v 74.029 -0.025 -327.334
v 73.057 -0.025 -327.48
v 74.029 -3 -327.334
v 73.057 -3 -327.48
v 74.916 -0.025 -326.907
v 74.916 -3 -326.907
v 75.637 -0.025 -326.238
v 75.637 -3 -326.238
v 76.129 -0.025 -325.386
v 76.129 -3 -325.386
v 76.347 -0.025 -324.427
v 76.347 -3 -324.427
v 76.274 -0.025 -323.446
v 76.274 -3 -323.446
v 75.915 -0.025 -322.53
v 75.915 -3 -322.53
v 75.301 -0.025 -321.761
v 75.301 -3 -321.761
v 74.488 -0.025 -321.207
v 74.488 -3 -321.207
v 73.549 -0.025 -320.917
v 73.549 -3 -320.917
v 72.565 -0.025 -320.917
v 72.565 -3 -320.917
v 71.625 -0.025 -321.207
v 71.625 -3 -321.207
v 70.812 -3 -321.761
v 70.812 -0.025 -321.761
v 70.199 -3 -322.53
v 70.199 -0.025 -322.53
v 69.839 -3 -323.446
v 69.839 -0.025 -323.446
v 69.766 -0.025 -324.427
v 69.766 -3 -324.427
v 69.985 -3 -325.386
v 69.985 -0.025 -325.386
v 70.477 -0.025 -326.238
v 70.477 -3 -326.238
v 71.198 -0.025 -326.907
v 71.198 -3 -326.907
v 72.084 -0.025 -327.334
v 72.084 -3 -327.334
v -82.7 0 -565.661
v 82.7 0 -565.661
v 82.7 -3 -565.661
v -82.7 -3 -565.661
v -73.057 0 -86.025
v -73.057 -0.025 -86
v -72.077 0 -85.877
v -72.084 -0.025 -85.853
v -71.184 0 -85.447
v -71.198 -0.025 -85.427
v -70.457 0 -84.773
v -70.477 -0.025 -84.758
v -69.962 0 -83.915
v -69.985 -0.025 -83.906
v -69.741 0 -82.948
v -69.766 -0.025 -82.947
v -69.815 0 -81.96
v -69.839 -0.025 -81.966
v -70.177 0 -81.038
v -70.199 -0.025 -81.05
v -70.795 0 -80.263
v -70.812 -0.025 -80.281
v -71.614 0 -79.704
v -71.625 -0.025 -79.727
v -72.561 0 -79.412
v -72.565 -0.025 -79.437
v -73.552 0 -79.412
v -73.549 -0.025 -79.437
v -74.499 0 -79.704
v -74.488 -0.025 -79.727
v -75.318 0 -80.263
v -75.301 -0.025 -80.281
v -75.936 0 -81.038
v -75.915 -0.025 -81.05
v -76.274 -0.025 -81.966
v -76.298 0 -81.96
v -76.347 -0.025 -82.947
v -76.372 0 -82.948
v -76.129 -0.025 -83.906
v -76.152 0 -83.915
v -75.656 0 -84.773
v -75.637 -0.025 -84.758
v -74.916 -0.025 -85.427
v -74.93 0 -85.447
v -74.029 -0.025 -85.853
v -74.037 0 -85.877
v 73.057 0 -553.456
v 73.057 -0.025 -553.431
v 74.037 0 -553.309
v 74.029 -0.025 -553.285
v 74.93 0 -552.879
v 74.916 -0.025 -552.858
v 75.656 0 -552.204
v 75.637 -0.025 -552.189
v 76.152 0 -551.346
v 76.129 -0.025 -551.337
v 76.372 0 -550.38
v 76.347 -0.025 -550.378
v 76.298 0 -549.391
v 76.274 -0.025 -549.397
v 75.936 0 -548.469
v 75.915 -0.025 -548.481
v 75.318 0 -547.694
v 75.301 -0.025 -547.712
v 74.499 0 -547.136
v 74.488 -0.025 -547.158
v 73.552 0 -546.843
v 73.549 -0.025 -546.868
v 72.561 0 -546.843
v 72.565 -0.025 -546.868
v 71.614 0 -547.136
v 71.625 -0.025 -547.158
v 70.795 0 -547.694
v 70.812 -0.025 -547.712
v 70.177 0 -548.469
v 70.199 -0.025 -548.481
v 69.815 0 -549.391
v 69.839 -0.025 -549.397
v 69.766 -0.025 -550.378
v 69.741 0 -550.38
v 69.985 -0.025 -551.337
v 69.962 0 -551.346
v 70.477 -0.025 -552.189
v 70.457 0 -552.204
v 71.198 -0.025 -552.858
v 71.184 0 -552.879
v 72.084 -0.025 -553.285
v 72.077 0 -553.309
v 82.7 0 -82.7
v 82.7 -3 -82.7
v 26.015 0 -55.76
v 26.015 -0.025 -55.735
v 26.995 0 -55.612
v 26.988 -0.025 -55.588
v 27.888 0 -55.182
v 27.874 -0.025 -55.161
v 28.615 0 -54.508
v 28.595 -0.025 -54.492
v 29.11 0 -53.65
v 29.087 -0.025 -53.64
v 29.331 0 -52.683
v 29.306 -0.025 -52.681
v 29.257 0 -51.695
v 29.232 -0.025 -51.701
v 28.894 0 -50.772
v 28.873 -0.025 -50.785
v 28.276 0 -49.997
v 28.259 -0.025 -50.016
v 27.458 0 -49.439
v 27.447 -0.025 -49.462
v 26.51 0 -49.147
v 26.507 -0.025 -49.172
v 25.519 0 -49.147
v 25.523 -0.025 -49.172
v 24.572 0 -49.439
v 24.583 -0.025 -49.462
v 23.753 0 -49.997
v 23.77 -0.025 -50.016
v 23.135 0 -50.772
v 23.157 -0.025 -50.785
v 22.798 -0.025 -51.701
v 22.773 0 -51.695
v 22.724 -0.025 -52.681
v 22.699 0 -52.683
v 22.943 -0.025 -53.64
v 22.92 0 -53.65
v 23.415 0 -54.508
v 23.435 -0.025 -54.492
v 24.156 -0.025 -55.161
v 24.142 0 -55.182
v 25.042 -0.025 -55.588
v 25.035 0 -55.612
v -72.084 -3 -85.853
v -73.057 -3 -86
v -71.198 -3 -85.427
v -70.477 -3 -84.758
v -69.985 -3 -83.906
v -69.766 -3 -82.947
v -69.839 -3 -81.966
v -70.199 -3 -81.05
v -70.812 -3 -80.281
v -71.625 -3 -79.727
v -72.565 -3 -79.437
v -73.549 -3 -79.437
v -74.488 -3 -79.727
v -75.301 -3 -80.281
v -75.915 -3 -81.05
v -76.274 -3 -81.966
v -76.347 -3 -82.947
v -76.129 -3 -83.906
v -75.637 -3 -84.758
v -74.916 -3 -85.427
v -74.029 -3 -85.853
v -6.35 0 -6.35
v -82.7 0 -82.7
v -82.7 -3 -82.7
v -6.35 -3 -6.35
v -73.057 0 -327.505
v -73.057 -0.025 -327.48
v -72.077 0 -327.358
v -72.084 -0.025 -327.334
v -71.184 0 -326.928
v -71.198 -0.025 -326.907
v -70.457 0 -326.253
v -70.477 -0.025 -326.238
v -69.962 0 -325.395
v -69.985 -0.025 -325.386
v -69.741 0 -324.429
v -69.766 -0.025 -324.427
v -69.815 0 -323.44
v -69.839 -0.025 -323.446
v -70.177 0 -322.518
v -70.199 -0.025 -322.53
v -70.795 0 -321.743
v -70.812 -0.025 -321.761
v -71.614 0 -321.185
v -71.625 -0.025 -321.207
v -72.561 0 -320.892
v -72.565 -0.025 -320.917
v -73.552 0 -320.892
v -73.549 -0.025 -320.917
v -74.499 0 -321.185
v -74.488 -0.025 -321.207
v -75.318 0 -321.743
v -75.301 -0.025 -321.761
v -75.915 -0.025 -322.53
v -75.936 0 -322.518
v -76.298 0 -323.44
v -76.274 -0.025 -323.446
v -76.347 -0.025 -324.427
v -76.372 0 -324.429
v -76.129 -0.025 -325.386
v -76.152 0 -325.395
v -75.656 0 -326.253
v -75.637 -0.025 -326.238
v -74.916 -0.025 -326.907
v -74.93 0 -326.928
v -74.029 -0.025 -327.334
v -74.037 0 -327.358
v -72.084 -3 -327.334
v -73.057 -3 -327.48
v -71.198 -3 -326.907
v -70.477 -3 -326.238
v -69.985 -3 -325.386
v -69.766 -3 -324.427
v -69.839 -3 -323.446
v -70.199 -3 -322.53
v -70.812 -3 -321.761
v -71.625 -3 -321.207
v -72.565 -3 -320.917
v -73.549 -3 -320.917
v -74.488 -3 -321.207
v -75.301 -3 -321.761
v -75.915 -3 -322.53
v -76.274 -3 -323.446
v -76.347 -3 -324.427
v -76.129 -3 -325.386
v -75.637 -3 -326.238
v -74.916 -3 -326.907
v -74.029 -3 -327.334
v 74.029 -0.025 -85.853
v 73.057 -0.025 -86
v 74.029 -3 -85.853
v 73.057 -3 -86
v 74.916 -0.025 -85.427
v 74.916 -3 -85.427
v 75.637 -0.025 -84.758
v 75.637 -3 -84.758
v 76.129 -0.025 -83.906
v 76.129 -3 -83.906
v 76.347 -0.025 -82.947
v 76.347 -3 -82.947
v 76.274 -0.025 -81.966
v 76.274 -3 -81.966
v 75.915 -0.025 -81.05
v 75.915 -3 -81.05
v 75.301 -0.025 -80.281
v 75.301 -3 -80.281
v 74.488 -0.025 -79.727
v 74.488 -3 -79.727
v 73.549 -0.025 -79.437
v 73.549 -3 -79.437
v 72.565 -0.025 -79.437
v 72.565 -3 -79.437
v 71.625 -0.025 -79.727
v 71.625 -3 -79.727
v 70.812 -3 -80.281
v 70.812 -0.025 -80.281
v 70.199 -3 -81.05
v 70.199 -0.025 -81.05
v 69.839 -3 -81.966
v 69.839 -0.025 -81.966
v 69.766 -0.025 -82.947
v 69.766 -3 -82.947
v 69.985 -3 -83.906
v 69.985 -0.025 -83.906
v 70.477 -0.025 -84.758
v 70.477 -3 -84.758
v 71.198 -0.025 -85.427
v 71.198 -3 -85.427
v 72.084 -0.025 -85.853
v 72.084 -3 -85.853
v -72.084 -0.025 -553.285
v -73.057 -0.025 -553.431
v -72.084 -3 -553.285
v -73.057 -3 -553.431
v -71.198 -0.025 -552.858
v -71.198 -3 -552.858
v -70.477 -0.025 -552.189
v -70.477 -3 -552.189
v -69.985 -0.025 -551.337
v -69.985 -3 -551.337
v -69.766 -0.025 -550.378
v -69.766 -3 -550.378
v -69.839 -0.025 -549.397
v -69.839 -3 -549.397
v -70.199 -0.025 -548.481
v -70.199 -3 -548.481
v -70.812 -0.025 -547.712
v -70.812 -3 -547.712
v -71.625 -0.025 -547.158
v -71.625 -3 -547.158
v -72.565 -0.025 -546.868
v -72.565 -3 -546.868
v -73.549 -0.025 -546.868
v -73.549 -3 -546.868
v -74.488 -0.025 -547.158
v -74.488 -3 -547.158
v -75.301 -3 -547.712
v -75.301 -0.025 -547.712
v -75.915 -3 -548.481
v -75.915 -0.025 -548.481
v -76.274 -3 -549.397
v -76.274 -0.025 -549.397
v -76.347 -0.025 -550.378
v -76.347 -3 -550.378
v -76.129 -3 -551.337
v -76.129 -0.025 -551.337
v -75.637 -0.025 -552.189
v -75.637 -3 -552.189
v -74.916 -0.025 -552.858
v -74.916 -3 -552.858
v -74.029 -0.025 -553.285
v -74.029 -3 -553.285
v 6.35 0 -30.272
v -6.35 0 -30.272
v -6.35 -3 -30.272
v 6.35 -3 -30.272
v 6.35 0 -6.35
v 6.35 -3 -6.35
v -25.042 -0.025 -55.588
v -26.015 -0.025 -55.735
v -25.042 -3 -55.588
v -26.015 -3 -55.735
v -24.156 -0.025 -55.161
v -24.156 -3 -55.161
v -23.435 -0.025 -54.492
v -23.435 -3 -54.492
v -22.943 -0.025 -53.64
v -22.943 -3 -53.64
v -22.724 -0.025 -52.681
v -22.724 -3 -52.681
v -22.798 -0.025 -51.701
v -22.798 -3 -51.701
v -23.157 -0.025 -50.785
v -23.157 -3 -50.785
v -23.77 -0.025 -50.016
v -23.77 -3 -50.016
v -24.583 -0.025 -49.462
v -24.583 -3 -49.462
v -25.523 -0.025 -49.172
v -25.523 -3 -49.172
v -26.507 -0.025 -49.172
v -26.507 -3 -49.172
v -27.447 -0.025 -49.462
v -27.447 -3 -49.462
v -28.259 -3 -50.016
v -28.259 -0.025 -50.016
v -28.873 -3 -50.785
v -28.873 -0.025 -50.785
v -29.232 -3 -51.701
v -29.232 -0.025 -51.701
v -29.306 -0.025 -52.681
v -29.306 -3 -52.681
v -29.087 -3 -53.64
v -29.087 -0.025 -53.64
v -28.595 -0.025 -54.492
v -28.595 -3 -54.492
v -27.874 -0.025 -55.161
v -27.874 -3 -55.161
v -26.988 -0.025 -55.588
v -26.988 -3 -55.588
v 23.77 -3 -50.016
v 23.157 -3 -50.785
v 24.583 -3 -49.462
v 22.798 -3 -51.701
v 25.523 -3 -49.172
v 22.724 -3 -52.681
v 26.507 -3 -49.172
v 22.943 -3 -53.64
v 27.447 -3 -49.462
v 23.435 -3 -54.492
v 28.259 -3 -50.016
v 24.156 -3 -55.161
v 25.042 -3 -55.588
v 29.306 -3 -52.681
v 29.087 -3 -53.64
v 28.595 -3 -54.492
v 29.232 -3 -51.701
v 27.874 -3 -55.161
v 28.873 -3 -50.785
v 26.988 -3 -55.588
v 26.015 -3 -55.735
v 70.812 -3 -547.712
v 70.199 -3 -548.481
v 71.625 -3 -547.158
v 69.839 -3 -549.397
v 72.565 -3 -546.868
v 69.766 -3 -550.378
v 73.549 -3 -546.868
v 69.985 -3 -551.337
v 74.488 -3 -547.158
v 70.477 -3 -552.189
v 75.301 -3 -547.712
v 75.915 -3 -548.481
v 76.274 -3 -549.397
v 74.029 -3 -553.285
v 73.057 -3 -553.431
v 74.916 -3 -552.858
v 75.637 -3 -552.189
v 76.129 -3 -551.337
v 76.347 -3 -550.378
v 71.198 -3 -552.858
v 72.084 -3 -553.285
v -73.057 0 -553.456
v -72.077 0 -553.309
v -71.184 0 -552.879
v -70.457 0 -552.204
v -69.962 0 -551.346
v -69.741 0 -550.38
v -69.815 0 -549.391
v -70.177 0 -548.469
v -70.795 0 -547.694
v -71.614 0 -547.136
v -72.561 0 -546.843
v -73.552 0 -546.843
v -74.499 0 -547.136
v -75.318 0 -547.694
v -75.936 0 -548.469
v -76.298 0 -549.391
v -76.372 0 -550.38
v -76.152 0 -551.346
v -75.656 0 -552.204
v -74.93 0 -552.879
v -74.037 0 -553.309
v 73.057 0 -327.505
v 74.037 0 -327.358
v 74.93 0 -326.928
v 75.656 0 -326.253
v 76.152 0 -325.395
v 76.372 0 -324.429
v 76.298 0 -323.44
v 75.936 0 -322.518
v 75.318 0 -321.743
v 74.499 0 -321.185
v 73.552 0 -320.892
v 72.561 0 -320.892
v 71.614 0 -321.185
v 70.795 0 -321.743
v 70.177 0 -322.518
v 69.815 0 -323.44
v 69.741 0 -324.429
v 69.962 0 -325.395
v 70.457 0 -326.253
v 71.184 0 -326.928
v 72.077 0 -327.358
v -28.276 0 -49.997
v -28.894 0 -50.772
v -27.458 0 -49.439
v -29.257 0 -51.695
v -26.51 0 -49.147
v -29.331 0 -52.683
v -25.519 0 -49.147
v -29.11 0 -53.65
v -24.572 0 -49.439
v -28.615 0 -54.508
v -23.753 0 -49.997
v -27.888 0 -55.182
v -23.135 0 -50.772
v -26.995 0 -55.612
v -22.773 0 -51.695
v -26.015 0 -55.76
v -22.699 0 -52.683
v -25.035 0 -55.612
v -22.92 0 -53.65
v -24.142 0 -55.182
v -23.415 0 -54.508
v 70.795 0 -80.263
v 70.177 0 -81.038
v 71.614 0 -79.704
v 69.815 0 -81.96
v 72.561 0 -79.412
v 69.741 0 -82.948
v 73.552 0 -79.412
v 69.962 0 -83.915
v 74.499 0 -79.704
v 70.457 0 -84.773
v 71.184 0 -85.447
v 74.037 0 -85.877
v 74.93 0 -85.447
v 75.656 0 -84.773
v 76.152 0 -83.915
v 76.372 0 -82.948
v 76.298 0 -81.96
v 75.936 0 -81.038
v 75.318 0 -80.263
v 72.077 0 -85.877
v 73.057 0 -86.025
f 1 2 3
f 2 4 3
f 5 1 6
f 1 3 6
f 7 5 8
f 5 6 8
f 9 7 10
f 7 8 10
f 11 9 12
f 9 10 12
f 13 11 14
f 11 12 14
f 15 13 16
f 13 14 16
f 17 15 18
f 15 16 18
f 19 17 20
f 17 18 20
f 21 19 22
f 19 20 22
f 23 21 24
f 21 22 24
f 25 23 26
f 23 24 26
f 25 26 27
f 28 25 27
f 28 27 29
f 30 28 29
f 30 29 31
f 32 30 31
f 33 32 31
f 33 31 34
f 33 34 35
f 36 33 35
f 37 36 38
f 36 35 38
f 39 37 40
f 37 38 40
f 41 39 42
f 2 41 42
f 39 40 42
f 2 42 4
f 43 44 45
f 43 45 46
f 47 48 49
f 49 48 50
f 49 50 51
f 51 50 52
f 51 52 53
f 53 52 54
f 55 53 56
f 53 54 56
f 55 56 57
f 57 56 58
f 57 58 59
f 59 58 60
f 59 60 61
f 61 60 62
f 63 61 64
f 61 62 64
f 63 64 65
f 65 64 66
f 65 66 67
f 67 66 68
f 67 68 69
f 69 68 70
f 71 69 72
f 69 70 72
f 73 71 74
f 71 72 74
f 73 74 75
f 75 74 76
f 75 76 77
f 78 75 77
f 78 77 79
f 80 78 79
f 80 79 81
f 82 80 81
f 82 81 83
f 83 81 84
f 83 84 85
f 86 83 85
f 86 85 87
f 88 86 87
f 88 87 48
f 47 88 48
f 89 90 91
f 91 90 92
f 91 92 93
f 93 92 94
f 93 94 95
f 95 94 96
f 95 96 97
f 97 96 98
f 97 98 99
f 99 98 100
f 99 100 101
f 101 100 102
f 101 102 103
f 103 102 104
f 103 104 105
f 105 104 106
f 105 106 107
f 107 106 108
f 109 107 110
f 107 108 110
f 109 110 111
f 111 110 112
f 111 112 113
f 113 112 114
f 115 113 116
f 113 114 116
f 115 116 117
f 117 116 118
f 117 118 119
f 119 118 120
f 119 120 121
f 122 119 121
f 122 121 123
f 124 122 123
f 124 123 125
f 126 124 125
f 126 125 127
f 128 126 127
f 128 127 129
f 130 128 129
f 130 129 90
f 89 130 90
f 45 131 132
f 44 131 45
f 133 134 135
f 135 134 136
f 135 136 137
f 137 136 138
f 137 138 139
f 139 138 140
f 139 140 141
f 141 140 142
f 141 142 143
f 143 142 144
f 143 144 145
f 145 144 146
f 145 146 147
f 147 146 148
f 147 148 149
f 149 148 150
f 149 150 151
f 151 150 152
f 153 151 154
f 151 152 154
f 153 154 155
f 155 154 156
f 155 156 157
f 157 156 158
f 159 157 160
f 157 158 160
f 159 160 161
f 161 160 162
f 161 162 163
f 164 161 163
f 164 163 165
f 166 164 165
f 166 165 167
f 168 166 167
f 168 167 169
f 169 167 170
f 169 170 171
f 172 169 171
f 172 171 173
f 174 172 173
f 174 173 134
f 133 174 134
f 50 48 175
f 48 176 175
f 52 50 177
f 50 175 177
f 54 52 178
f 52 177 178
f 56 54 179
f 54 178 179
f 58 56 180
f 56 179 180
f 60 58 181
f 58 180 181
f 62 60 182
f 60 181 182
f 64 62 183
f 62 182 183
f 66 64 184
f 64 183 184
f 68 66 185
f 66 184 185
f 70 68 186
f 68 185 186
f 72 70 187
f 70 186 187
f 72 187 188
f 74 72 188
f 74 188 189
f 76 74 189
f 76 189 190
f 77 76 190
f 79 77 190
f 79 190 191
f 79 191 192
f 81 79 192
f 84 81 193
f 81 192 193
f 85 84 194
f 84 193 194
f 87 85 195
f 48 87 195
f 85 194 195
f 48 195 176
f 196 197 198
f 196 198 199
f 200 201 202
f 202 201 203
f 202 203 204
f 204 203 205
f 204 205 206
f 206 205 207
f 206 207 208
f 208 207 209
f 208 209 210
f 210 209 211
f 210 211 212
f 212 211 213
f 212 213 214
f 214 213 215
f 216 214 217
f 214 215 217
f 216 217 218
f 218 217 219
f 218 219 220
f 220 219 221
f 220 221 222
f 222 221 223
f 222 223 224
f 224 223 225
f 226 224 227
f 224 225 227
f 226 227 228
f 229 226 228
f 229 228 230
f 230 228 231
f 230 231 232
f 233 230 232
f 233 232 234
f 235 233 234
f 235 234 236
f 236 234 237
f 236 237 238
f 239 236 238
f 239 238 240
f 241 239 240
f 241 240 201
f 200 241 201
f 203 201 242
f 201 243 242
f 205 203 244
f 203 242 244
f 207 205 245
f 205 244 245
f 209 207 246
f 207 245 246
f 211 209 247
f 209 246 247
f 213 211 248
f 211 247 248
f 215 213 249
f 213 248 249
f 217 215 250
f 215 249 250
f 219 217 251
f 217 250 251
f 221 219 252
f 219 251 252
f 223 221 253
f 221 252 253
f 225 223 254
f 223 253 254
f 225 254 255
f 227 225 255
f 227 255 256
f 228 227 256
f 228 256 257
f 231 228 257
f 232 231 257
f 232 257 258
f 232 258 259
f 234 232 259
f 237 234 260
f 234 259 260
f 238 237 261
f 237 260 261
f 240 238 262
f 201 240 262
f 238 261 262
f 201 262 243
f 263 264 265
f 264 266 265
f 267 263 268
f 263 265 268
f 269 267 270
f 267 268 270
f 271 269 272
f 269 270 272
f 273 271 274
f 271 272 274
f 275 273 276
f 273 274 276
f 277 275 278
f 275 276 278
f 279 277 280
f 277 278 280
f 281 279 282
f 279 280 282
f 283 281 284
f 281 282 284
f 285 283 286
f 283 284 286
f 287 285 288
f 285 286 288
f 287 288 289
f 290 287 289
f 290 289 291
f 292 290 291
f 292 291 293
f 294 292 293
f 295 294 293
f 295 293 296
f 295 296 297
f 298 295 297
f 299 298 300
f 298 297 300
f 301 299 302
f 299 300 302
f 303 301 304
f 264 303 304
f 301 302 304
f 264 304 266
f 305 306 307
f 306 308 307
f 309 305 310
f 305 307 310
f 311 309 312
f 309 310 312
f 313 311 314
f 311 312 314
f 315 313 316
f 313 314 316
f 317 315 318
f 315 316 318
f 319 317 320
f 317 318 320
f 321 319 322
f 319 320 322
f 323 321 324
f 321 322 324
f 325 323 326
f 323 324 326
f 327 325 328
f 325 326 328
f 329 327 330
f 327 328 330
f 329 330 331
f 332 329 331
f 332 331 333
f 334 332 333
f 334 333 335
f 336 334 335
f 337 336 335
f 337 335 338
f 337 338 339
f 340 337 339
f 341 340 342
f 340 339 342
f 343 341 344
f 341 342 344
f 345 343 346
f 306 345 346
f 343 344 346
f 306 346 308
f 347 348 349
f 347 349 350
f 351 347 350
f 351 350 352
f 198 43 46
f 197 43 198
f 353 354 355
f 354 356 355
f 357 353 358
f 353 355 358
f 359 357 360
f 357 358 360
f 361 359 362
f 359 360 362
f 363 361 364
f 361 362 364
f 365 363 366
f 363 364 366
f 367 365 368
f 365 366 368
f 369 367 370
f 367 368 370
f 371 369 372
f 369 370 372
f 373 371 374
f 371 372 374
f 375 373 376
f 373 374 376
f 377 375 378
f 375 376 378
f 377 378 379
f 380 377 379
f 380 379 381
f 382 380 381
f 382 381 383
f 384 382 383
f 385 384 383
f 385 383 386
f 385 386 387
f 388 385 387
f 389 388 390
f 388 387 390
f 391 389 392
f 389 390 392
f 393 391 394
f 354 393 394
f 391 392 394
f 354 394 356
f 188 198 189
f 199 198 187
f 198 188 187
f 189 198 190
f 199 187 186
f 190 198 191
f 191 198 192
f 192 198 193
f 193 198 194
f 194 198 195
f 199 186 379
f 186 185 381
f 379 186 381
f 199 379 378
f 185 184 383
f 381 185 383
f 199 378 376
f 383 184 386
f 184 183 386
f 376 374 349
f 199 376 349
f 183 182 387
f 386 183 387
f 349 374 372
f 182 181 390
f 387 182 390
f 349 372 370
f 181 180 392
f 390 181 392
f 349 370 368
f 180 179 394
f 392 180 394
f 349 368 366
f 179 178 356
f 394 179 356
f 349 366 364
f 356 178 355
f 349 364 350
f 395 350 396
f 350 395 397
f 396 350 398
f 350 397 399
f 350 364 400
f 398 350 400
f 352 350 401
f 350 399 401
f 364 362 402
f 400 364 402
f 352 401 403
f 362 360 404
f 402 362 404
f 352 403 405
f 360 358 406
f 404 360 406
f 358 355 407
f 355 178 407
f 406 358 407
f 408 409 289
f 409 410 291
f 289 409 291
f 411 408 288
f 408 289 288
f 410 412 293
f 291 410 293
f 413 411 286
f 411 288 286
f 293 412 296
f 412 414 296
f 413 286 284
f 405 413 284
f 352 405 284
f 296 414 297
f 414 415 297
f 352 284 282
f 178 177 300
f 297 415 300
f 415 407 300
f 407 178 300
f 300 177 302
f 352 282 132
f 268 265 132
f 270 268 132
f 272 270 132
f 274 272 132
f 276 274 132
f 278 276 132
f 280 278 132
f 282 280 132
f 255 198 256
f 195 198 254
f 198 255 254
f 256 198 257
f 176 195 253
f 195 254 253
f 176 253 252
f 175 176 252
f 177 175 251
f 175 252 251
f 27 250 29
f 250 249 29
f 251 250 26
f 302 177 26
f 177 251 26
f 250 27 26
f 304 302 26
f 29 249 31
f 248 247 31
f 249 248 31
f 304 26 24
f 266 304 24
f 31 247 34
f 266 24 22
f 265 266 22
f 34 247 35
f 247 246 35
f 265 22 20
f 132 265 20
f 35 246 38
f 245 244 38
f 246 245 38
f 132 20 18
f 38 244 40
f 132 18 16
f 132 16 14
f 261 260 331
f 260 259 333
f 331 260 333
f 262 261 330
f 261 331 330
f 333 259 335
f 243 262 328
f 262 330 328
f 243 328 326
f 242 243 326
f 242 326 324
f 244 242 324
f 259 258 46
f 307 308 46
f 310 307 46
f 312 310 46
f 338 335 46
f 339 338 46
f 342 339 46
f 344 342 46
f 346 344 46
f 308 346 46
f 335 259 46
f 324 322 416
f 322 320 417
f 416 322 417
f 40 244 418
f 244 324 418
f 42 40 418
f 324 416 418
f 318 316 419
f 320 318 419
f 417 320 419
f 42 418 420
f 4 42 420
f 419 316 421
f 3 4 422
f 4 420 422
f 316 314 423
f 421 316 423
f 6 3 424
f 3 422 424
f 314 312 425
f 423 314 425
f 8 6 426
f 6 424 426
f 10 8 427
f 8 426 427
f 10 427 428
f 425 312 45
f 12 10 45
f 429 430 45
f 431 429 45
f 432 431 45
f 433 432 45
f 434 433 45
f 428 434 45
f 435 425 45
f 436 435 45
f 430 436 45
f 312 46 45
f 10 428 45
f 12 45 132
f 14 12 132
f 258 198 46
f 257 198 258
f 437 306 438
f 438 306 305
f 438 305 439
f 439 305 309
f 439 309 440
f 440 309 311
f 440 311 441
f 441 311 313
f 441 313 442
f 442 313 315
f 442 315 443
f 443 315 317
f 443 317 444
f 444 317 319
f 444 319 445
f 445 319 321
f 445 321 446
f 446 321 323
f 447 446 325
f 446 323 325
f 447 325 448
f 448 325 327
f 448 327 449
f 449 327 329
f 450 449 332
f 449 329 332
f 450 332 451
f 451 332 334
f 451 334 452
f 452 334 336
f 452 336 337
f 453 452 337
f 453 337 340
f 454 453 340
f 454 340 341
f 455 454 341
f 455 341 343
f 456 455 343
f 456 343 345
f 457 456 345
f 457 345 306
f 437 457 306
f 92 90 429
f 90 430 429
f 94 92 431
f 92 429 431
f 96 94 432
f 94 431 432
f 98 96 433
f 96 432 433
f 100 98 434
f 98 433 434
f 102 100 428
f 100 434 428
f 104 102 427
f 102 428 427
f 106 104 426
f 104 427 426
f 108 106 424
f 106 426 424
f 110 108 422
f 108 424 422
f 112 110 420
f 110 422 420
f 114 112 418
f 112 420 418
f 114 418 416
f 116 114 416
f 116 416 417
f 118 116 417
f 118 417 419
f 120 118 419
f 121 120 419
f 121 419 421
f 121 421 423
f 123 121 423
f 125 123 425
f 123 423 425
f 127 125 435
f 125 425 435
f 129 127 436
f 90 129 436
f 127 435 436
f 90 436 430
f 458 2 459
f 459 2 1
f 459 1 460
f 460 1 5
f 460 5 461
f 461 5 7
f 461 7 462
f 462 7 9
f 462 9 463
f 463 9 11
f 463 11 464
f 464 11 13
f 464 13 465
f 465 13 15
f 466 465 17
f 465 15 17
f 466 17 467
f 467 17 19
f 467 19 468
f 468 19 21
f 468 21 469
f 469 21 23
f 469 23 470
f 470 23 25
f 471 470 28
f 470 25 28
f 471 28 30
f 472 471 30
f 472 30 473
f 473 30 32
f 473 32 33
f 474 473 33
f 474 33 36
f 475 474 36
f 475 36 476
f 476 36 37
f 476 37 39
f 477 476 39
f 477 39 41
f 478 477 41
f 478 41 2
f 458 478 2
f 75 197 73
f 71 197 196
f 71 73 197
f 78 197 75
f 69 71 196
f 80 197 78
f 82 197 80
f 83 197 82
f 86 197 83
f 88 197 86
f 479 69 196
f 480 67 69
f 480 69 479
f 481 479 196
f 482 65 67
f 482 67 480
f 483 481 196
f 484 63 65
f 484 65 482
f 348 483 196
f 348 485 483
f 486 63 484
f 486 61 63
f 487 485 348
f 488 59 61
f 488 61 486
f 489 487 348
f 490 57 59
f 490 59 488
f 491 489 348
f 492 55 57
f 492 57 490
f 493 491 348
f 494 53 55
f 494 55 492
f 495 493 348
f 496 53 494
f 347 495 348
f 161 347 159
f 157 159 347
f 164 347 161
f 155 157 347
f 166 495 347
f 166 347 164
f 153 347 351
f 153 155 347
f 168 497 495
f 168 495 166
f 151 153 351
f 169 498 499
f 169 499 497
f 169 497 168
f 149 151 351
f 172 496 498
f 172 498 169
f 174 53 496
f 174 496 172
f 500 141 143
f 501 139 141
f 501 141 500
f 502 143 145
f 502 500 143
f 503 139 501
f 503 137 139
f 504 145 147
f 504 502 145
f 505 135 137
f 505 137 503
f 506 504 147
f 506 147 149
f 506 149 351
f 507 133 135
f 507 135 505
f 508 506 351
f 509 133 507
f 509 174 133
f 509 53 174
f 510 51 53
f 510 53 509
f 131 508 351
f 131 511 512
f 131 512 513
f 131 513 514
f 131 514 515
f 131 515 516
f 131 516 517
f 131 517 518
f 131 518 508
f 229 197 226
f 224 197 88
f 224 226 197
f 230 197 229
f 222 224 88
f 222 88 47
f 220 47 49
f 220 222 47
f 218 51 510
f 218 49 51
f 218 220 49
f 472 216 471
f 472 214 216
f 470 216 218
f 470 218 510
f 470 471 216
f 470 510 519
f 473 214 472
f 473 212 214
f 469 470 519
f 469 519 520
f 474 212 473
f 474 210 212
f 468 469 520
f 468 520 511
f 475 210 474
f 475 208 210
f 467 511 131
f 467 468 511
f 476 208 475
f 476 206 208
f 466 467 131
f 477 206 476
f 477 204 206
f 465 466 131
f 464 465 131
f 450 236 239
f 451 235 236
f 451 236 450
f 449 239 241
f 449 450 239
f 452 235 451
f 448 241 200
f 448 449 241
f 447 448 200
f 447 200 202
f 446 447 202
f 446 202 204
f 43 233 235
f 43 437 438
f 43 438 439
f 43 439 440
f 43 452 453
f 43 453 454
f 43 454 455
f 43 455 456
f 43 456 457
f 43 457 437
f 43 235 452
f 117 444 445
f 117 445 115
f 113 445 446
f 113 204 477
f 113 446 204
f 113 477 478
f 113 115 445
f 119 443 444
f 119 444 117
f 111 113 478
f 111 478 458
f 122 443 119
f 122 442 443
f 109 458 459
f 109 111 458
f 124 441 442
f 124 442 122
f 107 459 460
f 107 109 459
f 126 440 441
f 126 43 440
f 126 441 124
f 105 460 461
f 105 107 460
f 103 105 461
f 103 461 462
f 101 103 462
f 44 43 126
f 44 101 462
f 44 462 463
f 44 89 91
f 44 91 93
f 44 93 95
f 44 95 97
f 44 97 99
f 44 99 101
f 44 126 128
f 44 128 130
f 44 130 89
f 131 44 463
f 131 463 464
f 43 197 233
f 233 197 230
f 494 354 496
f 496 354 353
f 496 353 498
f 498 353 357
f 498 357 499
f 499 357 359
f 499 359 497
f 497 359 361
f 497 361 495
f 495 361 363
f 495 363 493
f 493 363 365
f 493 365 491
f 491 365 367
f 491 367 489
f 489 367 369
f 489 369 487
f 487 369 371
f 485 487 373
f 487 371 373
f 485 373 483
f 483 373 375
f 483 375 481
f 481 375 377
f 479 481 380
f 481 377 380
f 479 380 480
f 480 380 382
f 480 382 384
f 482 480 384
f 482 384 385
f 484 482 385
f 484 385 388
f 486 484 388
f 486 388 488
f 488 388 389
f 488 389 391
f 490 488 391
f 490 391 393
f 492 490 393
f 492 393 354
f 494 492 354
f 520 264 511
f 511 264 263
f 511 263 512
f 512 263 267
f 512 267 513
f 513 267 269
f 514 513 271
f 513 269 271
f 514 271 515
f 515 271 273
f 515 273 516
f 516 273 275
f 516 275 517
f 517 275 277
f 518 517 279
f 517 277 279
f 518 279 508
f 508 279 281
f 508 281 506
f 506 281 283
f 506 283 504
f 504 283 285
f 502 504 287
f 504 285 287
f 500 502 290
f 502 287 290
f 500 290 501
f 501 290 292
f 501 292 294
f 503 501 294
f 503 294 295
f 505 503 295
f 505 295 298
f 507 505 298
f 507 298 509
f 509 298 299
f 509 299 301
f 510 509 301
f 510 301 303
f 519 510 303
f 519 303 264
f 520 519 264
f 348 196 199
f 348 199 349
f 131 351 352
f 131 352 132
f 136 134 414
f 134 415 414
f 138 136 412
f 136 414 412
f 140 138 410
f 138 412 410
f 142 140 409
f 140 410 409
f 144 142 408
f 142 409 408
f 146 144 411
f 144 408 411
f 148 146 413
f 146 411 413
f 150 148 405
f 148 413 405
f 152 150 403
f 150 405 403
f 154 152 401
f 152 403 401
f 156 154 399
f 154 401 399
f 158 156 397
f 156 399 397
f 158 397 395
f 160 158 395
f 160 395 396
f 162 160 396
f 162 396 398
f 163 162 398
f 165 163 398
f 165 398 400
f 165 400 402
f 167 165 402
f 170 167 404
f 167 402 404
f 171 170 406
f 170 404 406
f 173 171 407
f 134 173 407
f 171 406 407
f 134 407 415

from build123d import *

# Parameters (mm, degrees)
BOSS_EXTRUDE1_DEPTH            = 3
M6_CLEARANCE_HOLE1_D           = 6.6
M6_CLEARANCE_HOLE1_DEPTH       = 12
M6_CLEARANCE_HOLE1_CSINK_D     = 6.65
M6_CLEARANCE_HOLE1_CSINK_ANGLE = 90
M6_CLEARANCE_HOLE1_TIP         = 1.982840043


with BuildPart() as part:
    # Sketch1 → Boss-Extrude1 (new body)
    with BuildSketch(Plane(origin=(0, 0, 0), x_dir=(1, 0, 0), z_dir=(0, 1, 0))):
        Polygon((6.35, 6.35), (82.7, 82.7), (82.7, 565.66051224), (-82.7, 565.66051224), (-82.7, 82.7), (-6.35, 6.35), (-6.35, 30.27243444), (6.35, 30.27243444), align=None)
    extrude(amount=-BOSS_EXTRUDE1_DEPTH)

    # M6 Clearance Hole1
    with Locations(Plane(origin=(-73.056682922, 0, -550.13126836), x_dir=(0, 0, 1), z_dir=(0, 1, 0))):
        with Locations((0, 0), (0, 146.113365844), (225.95101224, 0), (225.95101224, 146.113365844), (467.43126836, 146.113365844), (467.43126836, 0), (497.696436729, 47.041768684), (497.696436729, 99.07159716)):
            CounterSinkHole(M6_CLEARANCE_HOLE1_D / 2, M6_CLEARANCE_HOLE1_CSINK_D / 2, depth=M6_CLEARANCE_HOLE1_DEPTH, counter_sink_angle=M6_CLEARANCE_HOLE1_CSINK_ANGLE)
            with Locations((0, 0, -(M6_CLEARANCE_HOLE1_DEPTH + M6_CLEARANCE_HOLE1_TIP / 2))):  # 118° drill point
                Cone(0, M6_CLEARANCE_HOLE1_D / 2, M6_CLEARANCE_HOLE1_TIP, mode=Mode.SUBTRACT)


solid = part.part
